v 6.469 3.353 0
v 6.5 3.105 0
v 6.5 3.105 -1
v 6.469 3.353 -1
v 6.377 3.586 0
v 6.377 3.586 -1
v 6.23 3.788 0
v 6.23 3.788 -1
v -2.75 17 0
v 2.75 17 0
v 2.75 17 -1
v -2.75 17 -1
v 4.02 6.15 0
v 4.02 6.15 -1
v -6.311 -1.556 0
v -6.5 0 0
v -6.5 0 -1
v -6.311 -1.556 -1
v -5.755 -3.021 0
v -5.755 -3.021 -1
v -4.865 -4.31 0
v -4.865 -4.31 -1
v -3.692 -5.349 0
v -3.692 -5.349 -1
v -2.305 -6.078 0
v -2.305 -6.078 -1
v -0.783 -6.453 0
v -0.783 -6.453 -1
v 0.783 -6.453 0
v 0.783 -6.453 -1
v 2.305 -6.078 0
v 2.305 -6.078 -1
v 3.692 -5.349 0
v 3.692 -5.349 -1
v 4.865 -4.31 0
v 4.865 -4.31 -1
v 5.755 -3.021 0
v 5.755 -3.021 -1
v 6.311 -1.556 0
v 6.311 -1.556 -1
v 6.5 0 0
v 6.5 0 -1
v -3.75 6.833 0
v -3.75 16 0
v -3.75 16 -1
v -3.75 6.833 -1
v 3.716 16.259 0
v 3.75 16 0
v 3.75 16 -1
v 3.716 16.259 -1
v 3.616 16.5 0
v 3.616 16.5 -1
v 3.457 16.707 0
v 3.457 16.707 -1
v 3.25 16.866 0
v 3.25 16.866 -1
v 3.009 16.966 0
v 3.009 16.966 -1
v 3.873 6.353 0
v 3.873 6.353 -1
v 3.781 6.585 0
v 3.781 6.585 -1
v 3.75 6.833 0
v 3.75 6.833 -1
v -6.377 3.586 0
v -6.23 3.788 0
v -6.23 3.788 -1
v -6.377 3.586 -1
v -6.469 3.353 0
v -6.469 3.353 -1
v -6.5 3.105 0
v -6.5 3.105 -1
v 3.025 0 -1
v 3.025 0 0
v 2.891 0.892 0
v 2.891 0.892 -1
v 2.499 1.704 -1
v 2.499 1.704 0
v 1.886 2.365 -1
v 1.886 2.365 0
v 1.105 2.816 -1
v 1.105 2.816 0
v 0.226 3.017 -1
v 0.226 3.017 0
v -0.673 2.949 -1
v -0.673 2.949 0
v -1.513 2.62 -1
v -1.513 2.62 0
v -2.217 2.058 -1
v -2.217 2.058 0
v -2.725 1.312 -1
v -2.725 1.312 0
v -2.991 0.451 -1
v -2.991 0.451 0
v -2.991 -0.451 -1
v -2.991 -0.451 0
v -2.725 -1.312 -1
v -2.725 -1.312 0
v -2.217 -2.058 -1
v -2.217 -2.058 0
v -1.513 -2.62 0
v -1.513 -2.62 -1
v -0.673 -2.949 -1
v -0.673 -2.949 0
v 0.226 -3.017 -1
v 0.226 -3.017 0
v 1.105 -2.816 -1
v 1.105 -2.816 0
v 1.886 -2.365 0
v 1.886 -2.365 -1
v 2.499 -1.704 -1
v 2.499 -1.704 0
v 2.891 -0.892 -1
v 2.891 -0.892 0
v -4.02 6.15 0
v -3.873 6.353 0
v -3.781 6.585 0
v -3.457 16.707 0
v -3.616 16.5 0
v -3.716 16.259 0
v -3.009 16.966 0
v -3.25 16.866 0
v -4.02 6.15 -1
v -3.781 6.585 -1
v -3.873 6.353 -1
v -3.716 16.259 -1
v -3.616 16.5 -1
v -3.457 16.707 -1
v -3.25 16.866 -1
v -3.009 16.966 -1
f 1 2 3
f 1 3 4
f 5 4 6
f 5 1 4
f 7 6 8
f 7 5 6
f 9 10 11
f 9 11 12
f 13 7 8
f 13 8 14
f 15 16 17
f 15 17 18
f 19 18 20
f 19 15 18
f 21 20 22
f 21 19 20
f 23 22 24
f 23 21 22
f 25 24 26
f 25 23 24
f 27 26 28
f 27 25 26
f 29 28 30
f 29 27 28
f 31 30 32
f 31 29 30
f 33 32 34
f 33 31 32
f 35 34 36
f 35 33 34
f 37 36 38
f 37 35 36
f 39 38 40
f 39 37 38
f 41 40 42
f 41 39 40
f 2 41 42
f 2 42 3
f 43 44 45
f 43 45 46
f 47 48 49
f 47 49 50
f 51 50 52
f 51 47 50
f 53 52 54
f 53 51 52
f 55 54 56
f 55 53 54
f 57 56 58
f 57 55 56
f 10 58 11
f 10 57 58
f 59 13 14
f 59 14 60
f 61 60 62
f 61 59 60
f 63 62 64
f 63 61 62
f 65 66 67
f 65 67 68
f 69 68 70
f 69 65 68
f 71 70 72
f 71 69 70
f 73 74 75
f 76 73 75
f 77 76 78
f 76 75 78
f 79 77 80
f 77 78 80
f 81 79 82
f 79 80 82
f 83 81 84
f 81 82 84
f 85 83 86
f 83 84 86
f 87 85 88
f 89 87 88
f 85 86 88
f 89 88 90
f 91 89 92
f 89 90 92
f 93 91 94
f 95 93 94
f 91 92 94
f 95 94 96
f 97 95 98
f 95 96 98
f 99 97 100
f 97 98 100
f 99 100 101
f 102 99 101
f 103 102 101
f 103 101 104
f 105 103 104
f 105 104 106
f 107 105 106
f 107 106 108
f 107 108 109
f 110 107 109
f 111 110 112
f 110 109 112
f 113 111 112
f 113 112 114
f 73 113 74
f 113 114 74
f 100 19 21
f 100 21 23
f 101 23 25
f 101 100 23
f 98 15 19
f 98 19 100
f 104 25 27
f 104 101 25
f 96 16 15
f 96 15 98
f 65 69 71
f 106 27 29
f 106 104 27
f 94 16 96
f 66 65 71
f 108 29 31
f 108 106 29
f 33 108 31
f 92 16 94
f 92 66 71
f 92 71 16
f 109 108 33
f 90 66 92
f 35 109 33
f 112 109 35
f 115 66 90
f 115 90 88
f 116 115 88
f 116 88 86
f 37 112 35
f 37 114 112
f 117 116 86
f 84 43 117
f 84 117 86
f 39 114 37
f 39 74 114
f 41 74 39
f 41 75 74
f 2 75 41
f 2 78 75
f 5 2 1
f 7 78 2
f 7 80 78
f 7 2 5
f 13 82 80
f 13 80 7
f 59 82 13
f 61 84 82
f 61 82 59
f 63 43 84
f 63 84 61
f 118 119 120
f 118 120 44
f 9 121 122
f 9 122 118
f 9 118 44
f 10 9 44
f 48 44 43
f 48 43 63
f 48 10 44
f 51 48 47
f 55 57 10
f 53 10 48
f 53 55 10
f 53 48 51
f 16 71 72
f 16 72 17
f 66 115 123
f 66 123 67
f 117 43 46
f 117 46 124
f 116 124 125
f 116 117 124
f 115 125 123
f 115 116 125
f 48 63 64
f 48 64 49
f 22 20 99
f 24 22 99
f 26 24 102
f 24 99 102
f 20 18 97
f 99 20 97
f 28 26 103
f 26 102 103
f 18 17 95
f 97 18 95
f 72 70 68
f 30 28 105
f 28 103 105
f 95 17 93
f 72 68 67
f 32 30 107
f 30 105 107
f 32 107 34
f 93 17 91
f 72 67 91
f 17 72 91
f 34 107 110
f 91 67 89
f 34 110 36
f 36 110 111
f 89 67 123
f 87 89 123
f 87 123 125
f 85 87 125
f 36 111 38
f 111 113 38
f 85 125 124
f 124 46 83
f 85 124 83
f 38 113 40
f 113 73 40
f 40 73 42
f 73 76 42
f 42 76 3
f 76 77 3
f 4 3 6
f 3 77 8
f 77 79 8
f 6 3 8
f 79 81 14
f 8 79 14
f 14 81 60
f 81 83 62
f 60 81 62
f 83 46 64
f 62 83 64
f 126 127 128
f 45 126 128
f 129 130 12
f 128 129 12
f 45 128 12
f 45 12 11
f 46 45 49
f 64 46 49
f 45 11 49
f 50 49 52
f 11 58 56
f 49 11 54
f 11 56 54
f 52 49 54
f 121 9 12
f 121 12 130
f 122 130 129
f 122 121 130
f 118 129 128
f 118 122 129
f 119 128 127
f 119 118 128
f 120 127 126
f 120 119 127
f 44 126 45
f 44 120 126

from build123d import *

# Parameters (mm, degrees)
SKETCH1_R          = 3.025
BASE_FLANGE1_DEPTH = 1


# Sheet-metal steps are written as plain solids
with BuildPart() as part:
    # Sketch1 → Base-Flange1 (new body)
    with BuildSketch(Plane.XY):
        with BuildLine():
            Line((6.5, 0), (6.5, 3.105048502))
            ThreePointArc((6.5, 3.105048502), (6.430087021, 3.472387764), (6.230123733, 3.788363462))
            Line((6.230123733, 3.788363462), (4.019876267, 6.150018373))
            ThreePointArc((4.019876267, 6.150018373), (3.819912979, 6.465994071), (3.75, 6.833333333))
            Line((3.75, 6.833333333), (3.75, 16))
            ThreePointArc((3.75, 16), (3.457106781, 16.707106781), (2.75, 17))
            Line((2.75, 17), (-2.75, 17))
            ThreePointArc((-2.75, 17), (-3.457106781, 16.707106781), (-3.75, 16))
            Line((-3.75, 16), (-3.75, 6.833333333))
            ThreePointArc((-3.75, 6.833333333), (-3.819912979, 6.465994071), (-4.019876267, 6.150018373))
            Line((-4.019876267, 6.150018373), (-6.230123733, 3.788363462))
            ThreePointArc((-6.230123733, 3.788363462), (-6.430087021, 3.472387764), (-6.5, 3.105048502))
            Line((-6.5, 3.105048502), (-6.5, 0))
            ThreePointArc((-6.5, 0), (0, -6.5), (6.5, 0))
        make_face()
        Circle(SKETCH1_R, mode=Mode.SUBTRACT)
    extrude(amount=-BASE_FLANGE1_DEPTH)


solid = part.part
